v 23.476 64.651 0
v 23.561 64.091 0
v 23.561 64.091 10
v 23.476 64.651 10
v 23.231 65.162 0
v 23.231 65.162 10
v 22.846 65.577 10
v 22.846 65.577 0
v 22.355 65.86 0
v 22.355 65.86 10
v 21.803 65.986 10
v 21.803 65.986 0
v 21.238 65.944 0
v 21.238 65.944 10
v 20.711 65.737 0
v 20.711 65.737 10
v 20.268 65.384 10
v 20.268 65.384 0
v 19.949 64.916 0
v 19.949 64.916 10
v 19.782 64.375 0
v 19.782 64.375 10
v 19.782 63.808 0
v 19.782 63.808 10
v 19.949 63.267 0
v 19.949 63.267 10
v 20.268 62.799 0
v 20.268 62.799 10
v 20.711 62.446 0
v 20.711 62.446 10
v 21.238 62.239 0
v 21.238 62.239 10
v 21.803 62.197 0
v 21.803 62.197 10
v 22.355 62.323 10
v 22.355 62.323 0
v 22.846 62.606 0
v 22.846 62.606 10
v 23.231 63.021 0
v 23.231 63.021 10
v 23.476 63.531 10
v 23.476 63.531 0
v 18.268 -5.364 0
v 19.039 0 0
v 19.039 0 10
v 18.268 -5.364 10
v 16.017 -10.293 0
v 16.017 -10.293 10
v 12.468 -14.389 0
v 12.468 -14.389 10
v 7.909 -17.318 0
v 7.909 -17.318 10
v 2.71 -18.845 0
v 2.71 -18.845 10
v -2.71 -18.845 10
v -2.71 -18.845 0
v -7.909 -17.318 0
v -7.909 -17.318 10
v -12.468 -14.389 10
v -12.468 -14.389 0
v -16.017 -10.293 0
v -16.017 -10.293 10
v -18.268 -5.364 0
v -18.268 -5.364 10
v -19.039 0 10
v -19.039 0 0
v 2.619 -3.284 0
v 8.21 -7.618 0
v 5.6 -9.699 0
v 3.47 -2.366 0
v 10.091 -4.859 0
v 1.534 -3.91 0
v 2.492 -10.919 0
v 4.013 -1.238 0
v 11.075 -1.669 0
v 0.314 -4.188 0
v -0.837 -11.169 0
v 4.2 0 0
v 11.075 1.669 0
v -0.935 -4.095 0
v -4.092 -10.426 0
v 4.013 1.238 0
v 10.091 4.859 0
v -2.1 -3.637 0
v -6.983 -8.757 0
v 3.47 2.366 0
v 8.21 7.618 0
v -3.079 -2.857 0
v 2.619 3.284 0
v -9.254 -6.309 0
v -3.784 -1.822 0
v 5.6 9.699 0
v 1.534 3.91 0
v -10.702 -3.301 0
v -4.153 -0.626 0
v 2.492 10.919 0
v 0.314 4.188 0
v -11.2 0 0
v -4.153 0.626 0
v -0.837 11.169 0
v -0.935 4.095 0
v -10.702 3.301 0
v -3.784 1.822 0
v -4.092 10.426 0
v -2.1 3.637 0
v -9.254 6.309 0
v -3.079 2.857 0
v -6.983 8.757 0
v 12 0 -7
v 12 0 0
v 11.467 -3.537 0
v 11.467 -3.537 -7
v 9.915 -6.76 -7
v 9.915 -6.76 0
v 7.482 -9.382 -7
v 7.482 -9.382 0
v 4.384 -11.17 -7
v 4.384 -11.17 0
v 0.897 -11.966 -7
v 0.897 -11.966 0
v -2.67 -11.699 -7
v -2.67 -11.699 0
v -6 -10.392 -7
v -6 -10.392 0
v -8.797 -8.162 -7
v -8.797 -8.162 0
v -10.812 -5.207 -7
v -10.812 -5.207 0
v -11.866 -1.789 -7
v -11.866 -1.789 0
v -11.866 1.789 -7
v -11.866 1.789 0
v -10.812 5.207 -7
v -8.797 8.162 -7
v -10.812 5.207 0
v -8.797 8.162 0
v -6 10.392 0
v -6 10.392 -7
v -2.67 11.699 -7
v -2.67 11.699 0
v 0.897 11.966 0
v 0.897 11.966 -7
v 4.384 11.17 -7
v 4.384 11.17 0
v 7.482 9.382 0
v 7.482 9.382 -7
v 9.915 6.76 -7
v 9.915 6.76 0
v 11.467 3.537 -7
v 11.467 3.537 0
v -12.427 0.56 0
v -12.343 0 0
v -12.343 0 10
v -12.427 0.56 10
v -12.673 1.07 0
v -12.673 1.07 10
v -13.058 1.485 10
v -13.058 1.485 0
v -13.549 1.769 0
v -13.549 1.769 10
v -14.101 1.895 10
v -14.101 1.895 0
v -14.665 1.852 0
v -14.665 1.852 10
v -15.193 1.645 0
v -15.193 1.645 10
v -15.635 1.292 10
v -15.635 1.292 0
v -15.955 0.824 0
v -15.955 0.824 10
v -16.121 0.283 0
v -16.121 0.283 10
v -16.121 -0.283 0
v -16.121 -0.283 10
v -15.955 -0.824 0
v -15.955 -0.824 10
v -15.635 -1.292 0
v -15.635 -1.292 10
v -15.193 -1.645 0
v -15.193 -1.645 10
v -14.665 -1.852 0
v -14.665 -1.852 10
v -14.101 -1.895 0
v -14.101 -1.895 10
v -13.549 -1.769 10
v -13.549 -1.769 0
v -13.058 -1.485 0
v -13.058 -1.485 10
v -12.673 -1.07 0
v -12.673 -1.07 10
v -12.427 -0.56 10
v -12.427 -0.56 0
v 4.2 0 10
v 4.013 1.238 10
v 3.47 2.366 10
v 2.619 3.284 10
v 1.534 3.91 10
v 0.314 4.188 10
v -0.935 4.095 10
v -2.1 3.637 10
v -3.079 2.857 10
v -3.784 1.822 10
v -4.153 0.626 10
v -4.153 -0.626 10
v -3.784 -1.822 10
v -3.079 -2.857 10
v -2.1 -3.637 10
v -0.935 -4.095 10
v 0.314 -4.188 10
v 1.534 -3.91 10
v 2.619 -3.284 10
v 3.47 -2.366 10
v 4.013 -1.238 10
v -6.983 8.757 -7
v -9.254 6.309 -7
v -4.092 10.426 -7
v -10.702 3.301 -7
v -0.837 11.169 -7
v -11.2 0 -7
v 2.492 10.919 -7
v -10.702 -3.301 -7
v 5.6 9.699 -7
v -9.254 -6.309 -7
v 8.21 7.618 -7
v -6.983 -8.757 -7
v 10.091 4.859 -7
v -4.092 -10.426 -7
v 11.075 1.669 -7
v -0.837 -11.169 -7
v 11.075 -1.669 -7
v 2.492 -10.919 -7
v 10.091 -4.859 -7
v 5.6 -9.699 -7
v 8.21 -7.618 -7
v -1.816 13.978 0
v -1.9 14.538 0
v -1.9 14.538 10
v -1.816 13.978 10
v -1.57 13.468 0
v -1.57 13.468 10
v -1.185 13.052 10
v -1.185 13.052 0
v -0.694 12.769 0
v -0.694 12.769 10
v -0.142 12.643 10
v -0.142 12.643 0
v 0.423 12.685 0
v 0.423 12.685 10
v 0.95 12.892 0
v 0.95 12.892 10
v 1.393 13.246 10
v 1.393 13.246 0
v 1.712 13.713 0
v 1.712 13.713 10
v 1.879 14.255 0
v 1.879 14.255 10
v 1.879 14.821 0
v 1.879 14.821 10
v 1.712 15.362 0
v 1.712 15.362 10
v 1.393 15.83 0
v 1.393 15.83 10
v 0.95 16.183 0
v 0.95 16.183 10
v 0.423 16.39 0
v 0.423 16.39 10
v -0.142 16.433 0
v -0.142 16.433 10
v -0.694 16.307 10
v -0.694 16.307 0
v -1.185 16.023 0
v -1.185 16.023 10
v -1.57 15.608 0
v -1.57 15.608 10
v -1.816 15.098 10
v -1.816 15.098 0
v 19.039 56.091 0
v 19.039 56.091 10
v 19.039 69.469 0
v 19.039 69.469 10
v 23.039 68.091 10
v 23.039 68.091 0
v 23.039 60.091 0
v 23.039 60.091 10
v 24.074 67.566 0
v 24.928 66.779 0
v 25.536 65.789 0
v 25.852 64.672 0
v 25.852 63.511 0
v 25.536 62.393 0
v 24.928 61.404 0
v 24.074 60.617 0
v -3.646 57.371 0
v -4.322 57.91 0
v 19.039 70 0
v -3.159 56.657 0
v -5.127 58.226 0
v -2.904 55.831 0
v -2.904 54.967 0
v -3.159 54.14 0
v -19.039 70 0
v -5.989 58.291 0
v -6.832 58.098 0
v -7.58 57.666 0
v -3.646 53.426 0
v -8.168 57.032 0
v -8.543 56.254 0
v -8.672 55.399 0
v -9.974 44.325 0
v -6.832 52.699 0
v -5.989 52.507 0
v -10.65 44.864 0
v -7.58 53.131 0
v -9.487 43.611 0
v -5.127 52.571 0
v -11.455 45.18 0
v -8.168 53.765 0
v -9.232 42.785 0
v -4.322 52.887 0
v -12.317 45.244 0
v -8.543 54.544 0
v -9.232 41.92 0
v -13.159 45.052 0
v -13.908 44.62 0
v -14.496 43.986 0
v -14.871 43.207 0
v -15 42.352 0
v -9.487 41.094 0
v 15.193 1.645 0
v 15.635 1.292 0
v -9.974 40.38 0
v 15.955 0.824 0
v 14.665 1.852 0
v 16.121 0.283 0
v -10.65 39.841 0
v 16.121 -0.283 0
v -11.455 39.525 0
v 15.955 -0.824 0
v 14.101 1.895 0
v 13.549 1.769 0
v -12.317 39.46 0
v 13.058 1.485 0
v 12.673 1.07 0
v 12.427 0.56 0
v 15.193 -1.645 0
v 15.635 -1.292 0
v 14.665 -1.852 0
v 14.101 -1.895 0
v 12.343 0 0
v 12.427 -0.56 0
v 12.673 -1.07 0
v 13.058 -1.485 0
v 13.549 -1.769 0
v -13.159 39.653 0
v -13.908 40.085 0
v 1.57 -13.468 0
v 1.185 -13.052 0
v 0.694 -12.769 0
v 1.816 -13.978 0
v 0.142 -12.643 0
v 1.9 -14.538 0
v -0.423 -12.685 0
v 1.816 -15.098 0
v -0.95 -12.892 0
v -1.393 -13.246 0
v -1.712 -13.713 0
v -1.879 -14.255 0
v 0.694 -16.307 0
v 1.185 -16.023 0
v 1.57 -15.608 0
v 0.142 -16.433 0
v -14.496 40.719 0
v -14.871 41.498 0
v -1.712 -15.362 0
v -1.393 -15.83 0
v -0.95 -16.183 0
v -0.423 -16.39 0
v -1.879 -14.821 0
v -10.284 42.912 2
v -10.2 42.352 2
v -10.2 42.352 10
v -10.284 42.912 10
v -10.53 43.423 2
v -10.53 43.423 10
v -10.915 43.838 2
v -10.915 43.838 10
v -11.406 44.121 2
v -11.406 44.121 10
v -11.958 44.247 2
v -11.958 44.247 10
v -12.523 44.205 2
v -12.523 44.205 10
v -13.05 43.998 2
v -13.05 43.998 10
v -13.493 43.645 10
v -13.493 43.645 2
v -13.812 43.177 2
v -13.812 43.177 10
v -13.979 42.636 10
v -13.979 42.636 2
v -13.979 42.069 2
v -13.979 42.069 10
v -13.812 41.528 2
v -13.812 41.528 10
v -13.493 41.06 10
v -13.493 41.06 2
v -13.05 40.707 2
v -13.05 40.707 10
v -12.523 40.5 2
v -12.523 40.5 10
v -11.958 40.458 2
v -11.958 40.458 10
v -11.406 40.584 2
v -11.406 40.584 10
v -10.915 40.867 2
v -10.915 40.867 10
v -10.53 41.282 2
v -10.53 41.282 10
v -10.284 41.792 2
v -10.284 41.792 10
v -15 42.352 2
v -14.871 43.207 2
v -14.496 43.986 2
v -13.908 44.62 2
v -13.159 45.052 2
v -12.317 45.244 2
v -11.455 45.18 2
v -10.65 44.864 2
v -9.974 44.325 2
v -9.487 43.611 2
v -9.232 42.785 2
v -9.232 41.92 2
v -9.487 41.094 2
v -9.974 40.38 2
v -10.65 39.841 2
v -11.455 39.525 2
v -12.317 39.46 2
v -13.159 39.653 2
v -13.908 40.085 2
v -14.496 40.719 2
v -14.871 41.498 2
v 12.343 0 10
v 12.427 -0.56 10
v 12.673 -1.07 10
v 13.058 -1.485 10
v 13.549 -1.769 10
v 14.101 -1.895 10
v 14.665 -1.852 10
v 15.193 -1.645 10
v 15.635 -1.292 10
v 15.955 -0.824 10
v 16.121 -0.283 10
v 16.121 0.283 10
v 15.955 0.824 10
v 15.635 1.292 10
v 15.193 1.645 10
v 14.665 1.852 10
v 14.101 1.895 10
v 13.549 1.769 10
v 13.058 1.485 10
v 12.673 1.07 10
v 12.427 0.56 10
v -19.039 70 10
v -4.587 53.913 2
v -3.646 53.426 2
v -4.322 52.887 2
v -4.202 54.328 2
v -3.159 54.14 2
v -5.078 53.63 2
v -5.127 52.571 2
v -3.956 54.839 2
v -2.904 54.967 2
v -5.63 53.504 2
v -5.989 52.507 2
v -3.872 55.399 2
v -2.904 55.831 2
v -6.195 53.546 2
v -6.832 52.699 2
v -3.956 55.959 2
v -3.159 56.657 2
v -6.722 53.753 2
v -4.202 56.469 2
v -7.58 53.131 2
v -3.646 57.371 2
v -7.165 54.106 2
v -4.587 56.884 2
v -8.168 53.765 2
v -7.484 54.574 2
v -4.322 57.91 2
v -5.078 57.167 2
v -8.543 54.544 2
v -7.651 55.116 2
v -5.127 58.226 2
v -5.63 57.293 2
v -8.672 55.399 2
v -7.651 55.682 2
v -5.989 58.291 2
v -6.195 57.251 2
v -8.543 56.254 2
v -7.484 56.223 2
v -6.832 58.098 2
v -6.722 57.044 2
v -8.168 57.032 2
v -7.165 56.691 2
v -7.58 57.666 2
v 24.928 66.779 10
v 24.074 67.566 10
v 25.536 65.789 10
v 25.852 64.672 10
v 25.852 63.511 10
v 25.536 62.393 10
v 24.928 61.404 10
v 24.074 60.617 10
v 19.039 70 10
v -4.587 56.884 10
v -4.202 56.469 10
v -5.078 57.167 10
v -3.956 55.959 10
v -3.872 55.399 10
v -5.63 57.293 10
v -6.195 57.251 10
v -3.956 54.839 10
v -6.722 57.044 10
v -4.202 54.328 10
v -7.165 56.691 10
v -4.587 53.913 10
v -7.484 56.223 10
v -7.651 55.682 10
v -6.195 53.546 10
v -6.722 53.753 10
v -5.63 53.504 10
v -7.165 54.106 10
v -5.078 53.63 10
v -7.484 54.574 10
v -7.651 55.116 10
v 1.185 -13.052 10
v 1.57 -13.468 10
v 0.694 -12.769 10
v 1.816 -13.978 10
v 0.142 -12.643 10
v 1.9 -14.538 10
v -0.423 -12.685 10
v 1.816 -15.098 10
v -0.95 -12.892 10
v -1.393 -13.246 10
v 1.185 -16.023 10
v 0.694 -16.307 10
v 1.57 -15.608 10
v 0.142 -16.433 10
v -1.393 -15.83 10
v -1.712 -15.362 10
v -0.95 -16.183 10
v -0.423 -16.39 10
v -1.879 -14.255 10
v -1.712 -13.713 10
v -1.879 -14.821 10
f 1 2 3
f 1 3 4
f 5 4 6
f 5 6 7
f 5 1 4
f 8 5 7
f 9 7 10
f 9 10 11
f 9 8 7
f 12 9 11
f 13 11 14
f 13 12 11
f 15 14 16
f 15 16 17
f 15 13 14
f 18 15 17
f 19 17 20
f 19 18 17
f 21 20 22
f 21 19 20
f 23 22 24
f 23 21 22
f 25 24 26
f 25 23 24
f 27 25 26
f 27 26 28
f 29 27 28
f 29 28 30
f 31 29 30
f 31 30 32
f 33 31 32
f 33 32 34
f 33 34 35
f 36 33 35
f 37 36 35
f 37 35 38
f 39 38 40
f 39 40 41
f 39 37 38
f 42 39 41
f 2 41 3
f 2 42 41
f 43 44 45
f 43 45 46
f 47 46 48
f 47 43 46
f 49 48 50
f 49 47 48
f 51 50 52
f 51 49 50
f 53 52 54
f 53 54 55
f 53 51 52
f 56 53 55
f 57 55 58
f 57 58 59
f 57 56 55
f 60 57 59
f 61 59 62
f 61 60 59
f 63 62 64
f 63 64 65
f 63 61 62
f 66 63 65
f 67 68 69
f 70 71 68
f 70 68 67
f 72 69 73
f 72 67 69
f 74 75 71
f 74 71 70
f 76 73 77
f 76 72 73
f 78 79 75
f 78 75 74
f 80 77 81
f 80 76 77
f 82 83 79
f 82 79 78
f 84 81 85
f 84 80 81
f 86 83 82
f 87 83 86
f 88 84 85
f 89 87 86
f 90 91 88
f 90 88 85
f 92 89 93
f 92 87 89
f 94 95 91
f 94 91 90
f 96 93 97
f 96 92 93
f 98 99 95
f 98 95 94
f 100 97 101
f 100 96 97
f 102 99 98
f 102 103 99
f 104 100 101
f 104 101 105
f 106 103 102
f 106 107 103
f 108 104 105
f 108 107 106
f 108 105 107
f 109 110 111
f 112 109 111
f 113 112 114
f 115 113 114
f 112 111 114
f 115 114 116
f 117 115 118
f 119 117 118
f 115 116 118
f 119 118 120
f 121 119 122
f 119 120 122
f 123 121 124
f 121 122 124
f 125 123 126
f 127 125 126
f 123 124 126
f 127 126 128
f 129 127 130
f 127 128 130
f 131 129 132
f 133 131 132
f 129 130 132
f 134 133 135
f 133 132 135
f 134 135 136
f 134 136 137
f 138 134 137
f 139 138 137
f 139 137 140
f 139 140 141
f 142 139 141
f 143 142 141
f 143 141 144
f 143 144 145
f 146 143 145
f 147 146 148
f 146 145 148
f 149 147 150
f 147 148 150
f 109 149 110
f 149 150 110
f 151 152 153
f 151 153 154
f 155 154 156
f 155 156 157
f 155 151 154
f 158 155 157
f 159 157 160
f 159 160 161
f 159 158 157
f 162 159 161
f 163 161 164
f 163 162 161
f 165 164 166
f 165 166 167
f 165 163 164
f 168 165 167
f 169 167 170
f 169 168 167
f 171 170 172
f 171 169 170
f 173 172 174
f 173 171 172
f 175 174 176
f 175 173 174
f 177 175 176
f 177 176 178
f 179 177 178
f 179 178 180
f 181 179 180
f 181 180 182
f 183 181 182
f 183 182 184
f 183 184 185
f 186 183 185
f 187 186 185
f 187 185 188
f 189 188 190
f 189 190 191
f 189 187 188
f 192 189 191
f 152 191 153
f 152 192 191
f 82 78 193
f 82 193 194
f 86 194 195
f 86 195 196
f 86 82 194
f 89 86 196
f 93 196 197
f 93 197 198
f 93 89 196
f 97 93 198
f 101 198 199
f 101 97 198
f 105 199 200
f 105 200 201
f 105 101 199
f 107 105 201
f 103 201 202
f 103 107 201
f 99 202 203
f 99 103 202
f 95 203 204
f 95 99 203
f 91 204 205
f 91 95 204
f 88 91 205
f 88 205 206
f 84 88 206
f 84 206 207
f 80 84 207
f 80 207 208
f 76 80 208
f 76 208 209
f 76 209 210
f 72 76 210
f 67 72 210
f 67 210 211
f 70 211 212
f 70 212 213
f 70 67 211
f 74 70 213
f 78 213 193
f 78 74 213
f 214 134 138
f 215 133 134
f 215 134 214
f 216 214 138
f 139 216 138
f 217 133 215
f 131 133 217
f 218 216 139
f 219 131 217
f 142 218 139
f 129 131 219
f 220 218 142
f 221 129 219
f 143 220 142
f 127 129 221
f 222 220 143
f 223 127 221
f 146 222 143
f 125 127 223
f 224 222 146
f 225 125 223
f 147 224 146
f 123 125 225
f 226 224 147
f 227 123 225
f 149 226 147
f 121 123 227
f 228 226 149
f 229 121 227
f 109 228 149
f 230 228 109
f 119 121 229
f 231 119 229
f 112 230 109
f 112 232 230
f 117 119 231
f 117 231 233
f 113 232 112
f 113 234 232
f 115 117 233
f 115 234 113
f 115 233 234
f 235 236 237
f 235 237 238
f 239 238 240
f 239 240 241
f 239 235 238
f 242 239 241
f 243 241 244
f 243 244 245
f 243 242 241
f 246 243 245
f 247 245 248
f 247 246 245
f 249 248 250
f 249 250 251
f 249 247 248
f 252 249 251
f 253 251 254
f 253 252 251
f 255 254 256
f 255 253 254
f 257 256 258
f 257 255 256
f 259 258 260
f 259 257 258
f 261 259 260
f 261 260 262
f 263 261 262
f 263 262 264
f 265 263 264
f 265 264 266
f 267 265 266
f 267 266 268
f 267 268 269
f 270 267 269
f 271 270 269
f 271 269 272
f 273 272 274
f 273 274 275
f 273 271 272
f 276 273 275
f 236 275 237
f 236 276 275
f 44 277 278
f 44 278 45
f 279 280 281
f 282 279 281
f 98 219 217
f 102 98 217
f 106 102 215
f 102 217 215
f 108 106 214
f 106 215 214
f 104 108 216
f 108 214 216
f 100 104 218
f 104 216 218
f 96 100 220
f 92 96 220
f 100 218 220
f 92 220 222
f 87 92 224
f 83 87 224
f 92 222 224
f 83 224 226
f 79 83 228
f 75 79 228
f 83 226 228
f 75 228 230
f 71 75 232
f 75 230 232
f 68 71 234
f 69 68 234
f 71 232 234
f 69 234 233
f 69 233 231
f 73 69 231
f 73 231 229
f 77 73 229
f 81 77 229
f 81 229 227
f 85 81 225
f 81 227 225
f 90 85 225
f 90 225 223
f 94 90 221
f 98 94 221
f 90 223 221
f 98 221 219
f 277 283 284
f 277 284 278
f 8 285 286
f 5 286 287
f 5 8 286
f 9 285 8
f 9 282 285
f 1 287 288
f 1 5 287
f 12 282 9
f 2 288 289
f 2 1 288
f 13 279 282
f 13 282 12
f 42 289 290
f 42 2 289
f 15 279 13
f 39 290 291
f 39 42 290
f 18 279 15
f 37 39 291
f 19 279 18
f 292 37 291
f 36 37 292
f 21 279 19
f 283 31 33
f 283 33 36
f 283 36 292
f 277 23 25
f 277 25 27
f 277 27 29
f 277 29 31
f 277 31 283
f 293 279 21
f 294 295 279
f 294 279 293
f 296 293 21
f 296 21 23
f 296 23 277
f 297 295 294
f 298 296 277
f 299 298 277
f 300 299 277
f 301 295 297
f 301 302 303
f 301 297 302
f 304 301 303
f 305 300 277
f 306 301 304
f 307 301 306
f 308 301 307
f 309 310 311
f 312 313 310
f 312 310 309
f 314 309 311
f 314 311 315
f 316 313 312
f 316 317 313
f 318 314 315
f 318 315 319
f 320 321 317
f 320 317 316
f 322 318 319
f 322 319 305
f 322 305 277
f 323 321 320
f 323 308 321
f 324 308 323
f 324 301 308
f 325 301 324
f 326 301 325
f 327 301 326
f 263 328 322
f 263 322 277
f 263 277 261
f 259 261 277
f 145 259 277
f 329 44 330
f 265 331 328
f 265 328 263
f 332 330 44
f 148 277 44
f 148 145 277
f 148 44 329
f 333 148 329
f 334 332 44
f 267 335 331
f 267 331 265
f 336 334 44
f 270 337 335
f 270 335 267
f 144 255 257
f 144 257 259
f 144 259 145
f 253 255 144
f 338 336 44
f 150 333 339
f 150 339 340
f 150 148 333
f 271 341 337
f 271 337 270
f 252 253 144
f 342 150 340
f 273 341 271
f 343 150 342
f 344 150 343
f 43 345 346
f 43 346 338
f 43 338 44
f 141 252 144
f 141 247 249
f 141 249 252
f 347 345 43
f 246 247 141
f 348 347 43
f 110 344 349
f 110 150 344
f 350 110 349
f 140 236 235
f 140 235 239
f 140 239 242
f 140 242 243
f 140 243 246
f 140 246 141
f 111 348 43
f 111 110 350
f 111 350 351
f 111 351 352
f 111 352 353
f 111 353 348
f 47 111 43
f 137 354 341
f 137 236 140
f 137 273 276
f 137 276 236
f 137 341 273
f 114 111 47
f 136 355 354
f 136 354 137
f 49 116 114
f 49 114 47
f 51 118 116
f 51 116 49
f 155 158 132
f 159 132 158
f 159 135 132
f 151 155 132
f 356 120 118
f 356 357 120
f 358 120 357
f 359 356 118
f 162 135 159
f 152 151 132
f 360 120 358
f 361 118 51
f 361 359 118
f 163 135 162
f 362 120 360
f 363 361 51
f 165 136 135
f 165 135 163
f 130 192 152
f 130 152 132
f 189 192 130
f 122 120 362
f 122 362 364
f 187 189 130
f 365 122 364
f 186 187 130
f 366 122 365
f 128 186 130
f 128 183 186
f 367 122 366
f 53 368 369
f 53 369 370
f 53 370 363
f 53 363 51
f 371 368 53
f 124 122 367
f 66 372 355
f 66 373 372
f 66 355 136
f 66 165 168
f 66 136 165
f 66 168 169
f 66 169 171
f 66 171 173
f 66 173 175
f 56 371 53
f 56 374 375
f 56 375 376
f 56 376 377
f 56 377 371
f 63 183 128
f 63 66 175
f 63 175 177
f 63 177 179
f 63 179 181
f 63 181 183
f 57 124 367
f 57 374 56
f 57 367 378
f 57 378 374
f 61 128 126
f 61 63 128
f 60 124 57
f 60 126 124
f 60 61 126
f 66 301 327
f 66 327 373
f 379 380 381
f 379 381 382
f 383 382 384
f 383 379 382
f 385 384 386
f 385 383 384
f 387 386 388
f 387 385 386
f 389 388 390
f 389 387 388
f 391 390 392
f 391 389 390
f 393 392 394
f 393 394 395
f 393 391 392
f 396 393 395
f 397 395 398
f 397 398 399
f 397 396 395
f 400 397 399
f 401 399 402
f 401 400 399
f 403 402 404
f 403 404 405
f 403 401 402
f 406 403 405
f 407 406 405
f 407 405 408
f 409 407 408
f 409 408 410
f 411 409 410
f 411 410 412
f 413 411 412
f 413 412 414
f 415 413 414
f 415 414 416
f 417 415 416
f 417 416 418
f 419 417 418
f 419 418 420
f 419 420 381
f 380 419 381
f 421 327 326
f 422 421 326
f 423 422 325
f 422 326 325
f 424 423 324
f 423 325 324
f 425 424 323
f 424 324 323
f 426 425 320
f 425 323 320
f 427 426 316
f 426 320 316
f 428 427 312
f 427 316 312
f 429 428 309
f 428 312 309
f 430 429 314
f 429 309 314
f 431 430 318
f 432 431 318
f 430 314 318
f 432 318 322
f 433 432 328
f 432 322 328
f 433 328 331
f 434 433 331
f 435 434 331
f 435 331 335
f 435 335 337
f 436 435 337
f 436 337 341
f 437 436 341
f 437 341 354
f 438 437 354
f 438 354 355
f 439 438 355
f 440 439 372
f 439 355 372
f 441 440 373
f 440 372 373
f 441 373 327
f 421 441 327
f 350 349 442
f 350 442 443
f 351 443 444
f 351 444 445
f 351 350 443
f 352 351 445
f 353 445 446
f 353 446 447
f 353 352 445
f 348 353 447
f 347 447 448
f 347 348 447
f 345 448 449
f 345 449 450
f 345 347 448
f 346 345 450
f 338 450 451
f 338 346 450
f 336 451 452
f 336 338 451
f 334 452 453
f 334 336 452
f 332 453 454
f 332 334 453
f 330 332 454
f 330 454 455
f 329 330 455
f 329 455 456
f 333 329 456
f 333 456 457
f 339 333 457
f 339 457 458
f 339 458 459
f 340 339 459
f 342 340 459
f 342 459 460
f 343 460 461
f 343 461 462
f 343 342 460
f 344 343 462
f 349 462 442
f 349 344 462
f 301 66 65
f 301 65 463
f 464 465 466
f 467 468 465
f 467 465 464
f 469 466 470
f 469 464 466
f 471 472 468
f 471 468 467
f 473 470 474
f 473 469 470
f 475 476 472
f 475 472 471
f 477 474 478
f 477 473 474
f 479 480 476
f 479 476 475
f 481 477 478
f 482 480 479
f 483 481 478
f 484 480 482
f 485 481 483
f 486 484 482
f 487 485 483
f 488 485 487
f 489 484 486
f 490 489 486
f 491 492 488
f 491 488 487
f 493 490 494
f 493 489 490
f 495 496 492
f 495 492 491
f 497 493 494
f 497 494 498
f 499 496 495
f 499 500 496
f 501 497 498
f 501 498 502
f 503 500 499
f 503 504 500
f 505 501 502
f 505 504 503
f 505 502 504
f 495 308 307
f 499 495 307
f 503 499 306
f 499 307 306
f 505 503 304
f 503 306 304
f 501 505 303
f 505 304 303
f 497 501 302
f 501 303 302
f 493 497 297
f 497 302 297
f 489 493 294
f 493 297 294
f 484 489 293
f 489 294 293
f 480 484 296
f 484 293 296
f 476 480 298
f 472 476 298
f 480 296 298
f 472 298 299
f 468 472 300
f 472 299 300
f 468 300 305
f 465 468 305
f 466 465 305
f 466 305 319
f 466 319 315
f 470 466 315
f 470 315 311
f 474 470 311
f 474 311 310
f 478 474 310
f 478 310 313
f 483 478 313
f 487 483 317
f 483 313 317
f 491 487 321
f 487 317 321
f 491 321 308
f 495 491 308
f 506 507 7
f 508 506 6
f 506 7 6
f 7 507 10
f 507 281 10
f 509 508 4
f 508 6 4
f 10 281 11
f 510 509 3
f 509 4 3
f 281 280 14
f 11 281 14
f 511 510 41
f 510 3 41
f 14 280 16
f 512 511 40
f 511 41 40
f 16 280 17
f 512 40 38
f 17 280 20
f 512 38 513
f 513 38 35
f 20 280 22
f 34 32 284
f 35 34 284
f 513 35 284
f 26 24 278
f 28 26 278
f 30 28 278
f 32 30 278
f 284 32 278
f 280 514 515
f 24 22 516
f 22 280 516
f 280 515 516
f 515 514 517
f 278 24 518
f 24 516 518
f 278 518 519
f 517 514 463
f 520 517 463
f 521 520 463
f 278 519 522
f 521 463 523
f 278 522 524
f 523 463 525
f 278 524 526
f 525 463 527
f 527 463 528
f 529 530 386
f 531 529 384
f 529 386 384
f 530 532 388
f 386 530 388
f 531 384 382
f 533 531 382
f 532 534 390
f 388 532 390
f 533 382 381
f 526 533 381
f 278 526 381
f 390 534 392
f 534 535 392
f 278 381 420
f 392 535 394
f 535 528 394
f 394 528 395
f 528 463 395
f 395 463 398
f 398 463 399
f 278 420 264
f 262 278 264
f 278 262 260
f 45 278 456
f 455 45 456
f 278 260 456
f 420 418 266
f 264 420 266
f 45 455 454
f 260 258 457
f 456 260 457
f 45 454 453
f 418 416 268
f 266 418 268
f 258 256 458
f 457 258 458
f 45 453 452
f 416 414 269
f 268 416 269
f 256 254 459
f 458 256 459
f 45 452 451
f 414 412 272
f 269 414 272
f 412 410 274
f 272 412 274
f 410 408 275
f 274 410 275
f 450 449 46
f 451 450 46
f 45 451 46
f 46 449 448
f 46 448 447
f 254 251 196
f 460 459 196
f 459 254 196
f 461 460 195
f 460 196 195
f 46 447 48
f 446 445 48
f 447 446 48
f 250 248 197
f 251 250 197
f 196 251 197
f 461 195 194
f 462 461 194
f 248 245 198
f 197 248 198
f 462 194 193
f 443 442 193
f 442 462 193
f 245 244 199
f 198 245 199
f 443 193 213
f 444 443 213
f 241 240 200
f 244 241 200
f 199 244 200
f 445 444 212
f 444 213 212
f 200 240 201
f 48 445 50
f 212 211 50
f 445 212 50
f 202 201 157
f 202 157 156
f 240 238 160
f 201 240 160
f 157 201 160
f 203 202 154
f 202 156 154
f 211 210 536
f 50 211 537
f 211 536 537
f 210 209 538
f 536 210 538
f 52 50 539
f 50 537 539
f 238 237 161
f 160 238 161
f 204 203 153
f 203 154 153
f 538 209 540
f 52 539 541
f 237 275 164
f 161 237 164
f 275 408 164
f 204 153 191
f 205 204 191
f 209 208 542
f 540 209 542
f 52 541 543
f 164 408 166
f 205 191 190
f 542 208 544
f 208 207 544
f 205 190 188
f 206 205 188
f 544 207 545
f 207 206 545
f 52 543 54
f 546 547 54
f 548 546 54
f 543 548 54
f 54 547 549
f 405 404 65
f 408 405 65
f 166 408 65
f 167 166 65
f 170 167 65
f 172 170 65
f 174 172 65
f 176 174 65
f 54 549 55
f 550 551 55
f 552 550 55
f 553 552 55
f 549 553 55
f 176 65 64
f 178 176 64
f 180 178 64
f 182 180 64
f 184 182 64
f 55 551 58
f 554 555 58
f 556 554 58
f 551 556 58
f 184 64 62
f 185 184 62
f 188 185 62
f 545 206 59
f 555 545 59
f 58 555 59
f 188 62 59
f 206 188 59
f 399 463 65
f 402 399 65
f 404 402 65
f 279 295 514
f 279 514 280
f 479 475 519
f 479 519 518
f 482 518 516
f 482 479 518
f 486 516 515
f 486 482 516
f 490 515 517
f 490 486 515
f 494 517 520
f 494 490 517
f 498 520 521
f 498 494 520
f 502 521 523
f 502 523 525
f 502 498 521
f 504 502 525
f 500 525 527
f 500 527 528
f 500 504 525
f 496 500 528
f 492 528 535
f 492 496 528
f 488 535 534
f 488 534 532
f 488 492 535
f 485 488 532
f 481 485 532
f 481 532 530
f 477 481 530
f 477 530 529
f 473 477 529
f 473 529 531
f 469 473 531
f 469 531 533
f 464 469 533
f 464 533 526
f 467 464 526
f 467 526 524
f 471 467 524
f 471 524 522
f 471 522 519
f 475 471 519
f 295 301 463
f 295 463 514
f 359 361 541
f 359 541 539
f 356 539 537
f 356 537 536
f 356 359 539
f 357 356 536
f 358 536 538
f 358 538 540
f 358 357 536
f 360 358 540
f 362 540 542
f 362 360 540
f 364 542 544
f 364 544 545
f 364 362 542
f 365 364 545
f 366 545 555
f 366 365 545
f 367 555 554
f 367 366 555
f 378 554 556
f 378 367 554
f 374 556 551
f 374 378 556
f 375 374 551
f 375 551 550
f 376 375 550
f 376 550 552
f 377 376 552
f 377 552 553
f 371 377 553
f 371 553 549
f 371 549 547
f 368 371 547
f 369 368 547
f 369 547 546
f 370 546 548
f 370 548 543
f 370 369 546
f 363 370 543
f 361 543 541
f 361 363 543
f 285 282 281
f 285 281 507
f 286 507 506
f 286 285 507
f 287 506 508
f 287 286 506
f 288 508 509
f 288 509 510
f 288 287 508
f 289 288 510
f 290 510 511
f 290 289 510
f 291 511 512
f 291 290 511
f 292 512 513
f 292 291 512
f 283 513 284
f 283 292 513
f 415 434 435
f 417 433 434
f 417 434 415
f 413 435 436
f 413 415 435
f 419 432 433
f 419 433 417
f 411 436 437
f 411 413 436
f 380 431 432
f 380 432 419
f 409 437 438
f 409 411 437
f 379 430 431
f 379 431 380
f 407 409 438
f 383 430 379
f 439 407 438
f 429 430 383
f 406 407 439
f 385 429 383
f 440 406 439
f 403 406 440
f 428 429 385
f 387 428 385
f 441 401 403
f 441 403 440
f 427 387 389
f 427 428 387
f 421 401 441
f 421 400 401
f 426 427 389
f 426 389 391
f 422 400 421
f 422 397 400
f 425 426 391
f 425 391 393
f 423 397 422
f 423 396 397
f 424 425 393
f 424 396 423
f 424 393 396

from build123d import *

# Parameters (mm, degrees)
SKETCH1_R           = 1.9
SKETCH1_R_2         = 4.2
BOSS_EXTRUDE1_DEPTH = 10
SKETCH2_R           = 12
BOSS_EXTRUDE2_DEPTH = 7
SKETCH3_R           = 11.2
CUT_EXTRUDE1_DEPTH  = 7
SKETCH4_R           = 2.9
CUT_EXTRUDE2_DEPTH  = 2


with BuildPart() as part:
    # Sketch1 → Boss-Extrude1 (new body)
    with BuildSketch(Plane(origin=(0, 0, 0), x_dir=(0, 1, 0), z_dir=(0, 0, 1))):
        with BuildLine():
            Line((0, 19.038851754), (70, 19.038851754))
            Line((70, 19.038851754), (70, -19.038851754))
            Line((70, -19.038851754), (69.469297143, -19.038851754))
            Line((69.469297143, -19.038851754), (68.091336606, -23.038851754))
            ThreePointArc((68.091336606, -23.038851754), (64.091336606, -25.891585633), (60.091336606, -23.038851754))
            Line((60.091336606, -23.038851754), (56.091336606, -19.038851754))
            Line((56.091336606, -19.038851754), (0, -19.038851754))
            ThreePointArc((0, -19.038851754), (-19.038851754, 0), (0, 19.038851754))
        make_face()
        with Locations(Location((0, 14.242669761, 0), (0, 0, 270))):
            Circle(SKETCH1_R, mode=Mode.SUBTRACT)
        with Locations(Location((0, 0, 0), (0, 0, 270))):
            Circle(SKETCH1_R_2, mode=Mode.SUBTRACT)
        with Locations(Location((0, -14.242669761, 0), (0, 0, 90))):
            Circle(SKETCH1_R, mode=Mode.SUBTRACT)
        with Locations(Location((-14.537854627, 0, 0), (0, 0, 270))):
            Circle(SKETCH1_R, mode=Mode.SUBTRACT)
        with Locations(Location((14.537854627, 0, 0), (0, 0, 90))):
            Circle(SKETCH1_R, mode=Mode.SUBTRACT)
        with Locations(Location((64.091336606, -21.660891217, 0), (0, 0, 270))):
            Circle(SKETCH1_R, mode=Mode.SUBTRACT)
        with Locations(Location((42.352384866, 12.099919194, 0), (0, 0, 270))):
            Circle(SKETCH1_R, mode=Mode.SUBTRACT)
        with Locations(Location((55.398759947, 5.77203667, 0), (0, 0, 270))):
            Circle(SKETCH1_R, mode=Mode.SUBTRACT)
    extrude(amount=BOSS_EXTRUDE1_DEPTH)

    # Sketch2 → Boss-Extrude2 (add)
    with BuildSketch(Plane(origin=(0, 0, 0), x_dir=(1, 0, 0), z_dir=(0, 0, -1))):
        Circle(SKETCH2_R)
    extrude(amount=BOSS_EXTRUDE2_DEPTH)

    # Sketch3 → Cut-Extrude1 (cut)
    with BuildSketch(Plane(origin=(0, 0, -7), x_dir=(1, 0, 0), z_dir=(0, 0, -1))):
        with Locations(Location((0, 0, 0), (0, 0, 180))):
            Circle(SKETCH3_R)
    extrude(amount=-CUT_EXTRUDE1_DEPTH, mode=Mode.SUBTRACT)

    # Sketch4 → Cut-Extrude2 (cut)
    with BuildSketch(Plane(origin=(0, 0, 0), x_dir=(1, 0, 0), z_dir=(0, 0, -1))):
        with Locations(Location((-12.099919194, -42.352384866, 0), (0, 0, 180))):
            Circle(SKETCH4_R)
        with Locations(Location((-5.77203667, -55.398759947, 0), (0, 0, 180))):
            Circle(SKETCH4_R)
    extrude(amount=-CUT_EXTRUDE2_DEPTH, mode=Mode.SUBTRACT)


solid = part.part
